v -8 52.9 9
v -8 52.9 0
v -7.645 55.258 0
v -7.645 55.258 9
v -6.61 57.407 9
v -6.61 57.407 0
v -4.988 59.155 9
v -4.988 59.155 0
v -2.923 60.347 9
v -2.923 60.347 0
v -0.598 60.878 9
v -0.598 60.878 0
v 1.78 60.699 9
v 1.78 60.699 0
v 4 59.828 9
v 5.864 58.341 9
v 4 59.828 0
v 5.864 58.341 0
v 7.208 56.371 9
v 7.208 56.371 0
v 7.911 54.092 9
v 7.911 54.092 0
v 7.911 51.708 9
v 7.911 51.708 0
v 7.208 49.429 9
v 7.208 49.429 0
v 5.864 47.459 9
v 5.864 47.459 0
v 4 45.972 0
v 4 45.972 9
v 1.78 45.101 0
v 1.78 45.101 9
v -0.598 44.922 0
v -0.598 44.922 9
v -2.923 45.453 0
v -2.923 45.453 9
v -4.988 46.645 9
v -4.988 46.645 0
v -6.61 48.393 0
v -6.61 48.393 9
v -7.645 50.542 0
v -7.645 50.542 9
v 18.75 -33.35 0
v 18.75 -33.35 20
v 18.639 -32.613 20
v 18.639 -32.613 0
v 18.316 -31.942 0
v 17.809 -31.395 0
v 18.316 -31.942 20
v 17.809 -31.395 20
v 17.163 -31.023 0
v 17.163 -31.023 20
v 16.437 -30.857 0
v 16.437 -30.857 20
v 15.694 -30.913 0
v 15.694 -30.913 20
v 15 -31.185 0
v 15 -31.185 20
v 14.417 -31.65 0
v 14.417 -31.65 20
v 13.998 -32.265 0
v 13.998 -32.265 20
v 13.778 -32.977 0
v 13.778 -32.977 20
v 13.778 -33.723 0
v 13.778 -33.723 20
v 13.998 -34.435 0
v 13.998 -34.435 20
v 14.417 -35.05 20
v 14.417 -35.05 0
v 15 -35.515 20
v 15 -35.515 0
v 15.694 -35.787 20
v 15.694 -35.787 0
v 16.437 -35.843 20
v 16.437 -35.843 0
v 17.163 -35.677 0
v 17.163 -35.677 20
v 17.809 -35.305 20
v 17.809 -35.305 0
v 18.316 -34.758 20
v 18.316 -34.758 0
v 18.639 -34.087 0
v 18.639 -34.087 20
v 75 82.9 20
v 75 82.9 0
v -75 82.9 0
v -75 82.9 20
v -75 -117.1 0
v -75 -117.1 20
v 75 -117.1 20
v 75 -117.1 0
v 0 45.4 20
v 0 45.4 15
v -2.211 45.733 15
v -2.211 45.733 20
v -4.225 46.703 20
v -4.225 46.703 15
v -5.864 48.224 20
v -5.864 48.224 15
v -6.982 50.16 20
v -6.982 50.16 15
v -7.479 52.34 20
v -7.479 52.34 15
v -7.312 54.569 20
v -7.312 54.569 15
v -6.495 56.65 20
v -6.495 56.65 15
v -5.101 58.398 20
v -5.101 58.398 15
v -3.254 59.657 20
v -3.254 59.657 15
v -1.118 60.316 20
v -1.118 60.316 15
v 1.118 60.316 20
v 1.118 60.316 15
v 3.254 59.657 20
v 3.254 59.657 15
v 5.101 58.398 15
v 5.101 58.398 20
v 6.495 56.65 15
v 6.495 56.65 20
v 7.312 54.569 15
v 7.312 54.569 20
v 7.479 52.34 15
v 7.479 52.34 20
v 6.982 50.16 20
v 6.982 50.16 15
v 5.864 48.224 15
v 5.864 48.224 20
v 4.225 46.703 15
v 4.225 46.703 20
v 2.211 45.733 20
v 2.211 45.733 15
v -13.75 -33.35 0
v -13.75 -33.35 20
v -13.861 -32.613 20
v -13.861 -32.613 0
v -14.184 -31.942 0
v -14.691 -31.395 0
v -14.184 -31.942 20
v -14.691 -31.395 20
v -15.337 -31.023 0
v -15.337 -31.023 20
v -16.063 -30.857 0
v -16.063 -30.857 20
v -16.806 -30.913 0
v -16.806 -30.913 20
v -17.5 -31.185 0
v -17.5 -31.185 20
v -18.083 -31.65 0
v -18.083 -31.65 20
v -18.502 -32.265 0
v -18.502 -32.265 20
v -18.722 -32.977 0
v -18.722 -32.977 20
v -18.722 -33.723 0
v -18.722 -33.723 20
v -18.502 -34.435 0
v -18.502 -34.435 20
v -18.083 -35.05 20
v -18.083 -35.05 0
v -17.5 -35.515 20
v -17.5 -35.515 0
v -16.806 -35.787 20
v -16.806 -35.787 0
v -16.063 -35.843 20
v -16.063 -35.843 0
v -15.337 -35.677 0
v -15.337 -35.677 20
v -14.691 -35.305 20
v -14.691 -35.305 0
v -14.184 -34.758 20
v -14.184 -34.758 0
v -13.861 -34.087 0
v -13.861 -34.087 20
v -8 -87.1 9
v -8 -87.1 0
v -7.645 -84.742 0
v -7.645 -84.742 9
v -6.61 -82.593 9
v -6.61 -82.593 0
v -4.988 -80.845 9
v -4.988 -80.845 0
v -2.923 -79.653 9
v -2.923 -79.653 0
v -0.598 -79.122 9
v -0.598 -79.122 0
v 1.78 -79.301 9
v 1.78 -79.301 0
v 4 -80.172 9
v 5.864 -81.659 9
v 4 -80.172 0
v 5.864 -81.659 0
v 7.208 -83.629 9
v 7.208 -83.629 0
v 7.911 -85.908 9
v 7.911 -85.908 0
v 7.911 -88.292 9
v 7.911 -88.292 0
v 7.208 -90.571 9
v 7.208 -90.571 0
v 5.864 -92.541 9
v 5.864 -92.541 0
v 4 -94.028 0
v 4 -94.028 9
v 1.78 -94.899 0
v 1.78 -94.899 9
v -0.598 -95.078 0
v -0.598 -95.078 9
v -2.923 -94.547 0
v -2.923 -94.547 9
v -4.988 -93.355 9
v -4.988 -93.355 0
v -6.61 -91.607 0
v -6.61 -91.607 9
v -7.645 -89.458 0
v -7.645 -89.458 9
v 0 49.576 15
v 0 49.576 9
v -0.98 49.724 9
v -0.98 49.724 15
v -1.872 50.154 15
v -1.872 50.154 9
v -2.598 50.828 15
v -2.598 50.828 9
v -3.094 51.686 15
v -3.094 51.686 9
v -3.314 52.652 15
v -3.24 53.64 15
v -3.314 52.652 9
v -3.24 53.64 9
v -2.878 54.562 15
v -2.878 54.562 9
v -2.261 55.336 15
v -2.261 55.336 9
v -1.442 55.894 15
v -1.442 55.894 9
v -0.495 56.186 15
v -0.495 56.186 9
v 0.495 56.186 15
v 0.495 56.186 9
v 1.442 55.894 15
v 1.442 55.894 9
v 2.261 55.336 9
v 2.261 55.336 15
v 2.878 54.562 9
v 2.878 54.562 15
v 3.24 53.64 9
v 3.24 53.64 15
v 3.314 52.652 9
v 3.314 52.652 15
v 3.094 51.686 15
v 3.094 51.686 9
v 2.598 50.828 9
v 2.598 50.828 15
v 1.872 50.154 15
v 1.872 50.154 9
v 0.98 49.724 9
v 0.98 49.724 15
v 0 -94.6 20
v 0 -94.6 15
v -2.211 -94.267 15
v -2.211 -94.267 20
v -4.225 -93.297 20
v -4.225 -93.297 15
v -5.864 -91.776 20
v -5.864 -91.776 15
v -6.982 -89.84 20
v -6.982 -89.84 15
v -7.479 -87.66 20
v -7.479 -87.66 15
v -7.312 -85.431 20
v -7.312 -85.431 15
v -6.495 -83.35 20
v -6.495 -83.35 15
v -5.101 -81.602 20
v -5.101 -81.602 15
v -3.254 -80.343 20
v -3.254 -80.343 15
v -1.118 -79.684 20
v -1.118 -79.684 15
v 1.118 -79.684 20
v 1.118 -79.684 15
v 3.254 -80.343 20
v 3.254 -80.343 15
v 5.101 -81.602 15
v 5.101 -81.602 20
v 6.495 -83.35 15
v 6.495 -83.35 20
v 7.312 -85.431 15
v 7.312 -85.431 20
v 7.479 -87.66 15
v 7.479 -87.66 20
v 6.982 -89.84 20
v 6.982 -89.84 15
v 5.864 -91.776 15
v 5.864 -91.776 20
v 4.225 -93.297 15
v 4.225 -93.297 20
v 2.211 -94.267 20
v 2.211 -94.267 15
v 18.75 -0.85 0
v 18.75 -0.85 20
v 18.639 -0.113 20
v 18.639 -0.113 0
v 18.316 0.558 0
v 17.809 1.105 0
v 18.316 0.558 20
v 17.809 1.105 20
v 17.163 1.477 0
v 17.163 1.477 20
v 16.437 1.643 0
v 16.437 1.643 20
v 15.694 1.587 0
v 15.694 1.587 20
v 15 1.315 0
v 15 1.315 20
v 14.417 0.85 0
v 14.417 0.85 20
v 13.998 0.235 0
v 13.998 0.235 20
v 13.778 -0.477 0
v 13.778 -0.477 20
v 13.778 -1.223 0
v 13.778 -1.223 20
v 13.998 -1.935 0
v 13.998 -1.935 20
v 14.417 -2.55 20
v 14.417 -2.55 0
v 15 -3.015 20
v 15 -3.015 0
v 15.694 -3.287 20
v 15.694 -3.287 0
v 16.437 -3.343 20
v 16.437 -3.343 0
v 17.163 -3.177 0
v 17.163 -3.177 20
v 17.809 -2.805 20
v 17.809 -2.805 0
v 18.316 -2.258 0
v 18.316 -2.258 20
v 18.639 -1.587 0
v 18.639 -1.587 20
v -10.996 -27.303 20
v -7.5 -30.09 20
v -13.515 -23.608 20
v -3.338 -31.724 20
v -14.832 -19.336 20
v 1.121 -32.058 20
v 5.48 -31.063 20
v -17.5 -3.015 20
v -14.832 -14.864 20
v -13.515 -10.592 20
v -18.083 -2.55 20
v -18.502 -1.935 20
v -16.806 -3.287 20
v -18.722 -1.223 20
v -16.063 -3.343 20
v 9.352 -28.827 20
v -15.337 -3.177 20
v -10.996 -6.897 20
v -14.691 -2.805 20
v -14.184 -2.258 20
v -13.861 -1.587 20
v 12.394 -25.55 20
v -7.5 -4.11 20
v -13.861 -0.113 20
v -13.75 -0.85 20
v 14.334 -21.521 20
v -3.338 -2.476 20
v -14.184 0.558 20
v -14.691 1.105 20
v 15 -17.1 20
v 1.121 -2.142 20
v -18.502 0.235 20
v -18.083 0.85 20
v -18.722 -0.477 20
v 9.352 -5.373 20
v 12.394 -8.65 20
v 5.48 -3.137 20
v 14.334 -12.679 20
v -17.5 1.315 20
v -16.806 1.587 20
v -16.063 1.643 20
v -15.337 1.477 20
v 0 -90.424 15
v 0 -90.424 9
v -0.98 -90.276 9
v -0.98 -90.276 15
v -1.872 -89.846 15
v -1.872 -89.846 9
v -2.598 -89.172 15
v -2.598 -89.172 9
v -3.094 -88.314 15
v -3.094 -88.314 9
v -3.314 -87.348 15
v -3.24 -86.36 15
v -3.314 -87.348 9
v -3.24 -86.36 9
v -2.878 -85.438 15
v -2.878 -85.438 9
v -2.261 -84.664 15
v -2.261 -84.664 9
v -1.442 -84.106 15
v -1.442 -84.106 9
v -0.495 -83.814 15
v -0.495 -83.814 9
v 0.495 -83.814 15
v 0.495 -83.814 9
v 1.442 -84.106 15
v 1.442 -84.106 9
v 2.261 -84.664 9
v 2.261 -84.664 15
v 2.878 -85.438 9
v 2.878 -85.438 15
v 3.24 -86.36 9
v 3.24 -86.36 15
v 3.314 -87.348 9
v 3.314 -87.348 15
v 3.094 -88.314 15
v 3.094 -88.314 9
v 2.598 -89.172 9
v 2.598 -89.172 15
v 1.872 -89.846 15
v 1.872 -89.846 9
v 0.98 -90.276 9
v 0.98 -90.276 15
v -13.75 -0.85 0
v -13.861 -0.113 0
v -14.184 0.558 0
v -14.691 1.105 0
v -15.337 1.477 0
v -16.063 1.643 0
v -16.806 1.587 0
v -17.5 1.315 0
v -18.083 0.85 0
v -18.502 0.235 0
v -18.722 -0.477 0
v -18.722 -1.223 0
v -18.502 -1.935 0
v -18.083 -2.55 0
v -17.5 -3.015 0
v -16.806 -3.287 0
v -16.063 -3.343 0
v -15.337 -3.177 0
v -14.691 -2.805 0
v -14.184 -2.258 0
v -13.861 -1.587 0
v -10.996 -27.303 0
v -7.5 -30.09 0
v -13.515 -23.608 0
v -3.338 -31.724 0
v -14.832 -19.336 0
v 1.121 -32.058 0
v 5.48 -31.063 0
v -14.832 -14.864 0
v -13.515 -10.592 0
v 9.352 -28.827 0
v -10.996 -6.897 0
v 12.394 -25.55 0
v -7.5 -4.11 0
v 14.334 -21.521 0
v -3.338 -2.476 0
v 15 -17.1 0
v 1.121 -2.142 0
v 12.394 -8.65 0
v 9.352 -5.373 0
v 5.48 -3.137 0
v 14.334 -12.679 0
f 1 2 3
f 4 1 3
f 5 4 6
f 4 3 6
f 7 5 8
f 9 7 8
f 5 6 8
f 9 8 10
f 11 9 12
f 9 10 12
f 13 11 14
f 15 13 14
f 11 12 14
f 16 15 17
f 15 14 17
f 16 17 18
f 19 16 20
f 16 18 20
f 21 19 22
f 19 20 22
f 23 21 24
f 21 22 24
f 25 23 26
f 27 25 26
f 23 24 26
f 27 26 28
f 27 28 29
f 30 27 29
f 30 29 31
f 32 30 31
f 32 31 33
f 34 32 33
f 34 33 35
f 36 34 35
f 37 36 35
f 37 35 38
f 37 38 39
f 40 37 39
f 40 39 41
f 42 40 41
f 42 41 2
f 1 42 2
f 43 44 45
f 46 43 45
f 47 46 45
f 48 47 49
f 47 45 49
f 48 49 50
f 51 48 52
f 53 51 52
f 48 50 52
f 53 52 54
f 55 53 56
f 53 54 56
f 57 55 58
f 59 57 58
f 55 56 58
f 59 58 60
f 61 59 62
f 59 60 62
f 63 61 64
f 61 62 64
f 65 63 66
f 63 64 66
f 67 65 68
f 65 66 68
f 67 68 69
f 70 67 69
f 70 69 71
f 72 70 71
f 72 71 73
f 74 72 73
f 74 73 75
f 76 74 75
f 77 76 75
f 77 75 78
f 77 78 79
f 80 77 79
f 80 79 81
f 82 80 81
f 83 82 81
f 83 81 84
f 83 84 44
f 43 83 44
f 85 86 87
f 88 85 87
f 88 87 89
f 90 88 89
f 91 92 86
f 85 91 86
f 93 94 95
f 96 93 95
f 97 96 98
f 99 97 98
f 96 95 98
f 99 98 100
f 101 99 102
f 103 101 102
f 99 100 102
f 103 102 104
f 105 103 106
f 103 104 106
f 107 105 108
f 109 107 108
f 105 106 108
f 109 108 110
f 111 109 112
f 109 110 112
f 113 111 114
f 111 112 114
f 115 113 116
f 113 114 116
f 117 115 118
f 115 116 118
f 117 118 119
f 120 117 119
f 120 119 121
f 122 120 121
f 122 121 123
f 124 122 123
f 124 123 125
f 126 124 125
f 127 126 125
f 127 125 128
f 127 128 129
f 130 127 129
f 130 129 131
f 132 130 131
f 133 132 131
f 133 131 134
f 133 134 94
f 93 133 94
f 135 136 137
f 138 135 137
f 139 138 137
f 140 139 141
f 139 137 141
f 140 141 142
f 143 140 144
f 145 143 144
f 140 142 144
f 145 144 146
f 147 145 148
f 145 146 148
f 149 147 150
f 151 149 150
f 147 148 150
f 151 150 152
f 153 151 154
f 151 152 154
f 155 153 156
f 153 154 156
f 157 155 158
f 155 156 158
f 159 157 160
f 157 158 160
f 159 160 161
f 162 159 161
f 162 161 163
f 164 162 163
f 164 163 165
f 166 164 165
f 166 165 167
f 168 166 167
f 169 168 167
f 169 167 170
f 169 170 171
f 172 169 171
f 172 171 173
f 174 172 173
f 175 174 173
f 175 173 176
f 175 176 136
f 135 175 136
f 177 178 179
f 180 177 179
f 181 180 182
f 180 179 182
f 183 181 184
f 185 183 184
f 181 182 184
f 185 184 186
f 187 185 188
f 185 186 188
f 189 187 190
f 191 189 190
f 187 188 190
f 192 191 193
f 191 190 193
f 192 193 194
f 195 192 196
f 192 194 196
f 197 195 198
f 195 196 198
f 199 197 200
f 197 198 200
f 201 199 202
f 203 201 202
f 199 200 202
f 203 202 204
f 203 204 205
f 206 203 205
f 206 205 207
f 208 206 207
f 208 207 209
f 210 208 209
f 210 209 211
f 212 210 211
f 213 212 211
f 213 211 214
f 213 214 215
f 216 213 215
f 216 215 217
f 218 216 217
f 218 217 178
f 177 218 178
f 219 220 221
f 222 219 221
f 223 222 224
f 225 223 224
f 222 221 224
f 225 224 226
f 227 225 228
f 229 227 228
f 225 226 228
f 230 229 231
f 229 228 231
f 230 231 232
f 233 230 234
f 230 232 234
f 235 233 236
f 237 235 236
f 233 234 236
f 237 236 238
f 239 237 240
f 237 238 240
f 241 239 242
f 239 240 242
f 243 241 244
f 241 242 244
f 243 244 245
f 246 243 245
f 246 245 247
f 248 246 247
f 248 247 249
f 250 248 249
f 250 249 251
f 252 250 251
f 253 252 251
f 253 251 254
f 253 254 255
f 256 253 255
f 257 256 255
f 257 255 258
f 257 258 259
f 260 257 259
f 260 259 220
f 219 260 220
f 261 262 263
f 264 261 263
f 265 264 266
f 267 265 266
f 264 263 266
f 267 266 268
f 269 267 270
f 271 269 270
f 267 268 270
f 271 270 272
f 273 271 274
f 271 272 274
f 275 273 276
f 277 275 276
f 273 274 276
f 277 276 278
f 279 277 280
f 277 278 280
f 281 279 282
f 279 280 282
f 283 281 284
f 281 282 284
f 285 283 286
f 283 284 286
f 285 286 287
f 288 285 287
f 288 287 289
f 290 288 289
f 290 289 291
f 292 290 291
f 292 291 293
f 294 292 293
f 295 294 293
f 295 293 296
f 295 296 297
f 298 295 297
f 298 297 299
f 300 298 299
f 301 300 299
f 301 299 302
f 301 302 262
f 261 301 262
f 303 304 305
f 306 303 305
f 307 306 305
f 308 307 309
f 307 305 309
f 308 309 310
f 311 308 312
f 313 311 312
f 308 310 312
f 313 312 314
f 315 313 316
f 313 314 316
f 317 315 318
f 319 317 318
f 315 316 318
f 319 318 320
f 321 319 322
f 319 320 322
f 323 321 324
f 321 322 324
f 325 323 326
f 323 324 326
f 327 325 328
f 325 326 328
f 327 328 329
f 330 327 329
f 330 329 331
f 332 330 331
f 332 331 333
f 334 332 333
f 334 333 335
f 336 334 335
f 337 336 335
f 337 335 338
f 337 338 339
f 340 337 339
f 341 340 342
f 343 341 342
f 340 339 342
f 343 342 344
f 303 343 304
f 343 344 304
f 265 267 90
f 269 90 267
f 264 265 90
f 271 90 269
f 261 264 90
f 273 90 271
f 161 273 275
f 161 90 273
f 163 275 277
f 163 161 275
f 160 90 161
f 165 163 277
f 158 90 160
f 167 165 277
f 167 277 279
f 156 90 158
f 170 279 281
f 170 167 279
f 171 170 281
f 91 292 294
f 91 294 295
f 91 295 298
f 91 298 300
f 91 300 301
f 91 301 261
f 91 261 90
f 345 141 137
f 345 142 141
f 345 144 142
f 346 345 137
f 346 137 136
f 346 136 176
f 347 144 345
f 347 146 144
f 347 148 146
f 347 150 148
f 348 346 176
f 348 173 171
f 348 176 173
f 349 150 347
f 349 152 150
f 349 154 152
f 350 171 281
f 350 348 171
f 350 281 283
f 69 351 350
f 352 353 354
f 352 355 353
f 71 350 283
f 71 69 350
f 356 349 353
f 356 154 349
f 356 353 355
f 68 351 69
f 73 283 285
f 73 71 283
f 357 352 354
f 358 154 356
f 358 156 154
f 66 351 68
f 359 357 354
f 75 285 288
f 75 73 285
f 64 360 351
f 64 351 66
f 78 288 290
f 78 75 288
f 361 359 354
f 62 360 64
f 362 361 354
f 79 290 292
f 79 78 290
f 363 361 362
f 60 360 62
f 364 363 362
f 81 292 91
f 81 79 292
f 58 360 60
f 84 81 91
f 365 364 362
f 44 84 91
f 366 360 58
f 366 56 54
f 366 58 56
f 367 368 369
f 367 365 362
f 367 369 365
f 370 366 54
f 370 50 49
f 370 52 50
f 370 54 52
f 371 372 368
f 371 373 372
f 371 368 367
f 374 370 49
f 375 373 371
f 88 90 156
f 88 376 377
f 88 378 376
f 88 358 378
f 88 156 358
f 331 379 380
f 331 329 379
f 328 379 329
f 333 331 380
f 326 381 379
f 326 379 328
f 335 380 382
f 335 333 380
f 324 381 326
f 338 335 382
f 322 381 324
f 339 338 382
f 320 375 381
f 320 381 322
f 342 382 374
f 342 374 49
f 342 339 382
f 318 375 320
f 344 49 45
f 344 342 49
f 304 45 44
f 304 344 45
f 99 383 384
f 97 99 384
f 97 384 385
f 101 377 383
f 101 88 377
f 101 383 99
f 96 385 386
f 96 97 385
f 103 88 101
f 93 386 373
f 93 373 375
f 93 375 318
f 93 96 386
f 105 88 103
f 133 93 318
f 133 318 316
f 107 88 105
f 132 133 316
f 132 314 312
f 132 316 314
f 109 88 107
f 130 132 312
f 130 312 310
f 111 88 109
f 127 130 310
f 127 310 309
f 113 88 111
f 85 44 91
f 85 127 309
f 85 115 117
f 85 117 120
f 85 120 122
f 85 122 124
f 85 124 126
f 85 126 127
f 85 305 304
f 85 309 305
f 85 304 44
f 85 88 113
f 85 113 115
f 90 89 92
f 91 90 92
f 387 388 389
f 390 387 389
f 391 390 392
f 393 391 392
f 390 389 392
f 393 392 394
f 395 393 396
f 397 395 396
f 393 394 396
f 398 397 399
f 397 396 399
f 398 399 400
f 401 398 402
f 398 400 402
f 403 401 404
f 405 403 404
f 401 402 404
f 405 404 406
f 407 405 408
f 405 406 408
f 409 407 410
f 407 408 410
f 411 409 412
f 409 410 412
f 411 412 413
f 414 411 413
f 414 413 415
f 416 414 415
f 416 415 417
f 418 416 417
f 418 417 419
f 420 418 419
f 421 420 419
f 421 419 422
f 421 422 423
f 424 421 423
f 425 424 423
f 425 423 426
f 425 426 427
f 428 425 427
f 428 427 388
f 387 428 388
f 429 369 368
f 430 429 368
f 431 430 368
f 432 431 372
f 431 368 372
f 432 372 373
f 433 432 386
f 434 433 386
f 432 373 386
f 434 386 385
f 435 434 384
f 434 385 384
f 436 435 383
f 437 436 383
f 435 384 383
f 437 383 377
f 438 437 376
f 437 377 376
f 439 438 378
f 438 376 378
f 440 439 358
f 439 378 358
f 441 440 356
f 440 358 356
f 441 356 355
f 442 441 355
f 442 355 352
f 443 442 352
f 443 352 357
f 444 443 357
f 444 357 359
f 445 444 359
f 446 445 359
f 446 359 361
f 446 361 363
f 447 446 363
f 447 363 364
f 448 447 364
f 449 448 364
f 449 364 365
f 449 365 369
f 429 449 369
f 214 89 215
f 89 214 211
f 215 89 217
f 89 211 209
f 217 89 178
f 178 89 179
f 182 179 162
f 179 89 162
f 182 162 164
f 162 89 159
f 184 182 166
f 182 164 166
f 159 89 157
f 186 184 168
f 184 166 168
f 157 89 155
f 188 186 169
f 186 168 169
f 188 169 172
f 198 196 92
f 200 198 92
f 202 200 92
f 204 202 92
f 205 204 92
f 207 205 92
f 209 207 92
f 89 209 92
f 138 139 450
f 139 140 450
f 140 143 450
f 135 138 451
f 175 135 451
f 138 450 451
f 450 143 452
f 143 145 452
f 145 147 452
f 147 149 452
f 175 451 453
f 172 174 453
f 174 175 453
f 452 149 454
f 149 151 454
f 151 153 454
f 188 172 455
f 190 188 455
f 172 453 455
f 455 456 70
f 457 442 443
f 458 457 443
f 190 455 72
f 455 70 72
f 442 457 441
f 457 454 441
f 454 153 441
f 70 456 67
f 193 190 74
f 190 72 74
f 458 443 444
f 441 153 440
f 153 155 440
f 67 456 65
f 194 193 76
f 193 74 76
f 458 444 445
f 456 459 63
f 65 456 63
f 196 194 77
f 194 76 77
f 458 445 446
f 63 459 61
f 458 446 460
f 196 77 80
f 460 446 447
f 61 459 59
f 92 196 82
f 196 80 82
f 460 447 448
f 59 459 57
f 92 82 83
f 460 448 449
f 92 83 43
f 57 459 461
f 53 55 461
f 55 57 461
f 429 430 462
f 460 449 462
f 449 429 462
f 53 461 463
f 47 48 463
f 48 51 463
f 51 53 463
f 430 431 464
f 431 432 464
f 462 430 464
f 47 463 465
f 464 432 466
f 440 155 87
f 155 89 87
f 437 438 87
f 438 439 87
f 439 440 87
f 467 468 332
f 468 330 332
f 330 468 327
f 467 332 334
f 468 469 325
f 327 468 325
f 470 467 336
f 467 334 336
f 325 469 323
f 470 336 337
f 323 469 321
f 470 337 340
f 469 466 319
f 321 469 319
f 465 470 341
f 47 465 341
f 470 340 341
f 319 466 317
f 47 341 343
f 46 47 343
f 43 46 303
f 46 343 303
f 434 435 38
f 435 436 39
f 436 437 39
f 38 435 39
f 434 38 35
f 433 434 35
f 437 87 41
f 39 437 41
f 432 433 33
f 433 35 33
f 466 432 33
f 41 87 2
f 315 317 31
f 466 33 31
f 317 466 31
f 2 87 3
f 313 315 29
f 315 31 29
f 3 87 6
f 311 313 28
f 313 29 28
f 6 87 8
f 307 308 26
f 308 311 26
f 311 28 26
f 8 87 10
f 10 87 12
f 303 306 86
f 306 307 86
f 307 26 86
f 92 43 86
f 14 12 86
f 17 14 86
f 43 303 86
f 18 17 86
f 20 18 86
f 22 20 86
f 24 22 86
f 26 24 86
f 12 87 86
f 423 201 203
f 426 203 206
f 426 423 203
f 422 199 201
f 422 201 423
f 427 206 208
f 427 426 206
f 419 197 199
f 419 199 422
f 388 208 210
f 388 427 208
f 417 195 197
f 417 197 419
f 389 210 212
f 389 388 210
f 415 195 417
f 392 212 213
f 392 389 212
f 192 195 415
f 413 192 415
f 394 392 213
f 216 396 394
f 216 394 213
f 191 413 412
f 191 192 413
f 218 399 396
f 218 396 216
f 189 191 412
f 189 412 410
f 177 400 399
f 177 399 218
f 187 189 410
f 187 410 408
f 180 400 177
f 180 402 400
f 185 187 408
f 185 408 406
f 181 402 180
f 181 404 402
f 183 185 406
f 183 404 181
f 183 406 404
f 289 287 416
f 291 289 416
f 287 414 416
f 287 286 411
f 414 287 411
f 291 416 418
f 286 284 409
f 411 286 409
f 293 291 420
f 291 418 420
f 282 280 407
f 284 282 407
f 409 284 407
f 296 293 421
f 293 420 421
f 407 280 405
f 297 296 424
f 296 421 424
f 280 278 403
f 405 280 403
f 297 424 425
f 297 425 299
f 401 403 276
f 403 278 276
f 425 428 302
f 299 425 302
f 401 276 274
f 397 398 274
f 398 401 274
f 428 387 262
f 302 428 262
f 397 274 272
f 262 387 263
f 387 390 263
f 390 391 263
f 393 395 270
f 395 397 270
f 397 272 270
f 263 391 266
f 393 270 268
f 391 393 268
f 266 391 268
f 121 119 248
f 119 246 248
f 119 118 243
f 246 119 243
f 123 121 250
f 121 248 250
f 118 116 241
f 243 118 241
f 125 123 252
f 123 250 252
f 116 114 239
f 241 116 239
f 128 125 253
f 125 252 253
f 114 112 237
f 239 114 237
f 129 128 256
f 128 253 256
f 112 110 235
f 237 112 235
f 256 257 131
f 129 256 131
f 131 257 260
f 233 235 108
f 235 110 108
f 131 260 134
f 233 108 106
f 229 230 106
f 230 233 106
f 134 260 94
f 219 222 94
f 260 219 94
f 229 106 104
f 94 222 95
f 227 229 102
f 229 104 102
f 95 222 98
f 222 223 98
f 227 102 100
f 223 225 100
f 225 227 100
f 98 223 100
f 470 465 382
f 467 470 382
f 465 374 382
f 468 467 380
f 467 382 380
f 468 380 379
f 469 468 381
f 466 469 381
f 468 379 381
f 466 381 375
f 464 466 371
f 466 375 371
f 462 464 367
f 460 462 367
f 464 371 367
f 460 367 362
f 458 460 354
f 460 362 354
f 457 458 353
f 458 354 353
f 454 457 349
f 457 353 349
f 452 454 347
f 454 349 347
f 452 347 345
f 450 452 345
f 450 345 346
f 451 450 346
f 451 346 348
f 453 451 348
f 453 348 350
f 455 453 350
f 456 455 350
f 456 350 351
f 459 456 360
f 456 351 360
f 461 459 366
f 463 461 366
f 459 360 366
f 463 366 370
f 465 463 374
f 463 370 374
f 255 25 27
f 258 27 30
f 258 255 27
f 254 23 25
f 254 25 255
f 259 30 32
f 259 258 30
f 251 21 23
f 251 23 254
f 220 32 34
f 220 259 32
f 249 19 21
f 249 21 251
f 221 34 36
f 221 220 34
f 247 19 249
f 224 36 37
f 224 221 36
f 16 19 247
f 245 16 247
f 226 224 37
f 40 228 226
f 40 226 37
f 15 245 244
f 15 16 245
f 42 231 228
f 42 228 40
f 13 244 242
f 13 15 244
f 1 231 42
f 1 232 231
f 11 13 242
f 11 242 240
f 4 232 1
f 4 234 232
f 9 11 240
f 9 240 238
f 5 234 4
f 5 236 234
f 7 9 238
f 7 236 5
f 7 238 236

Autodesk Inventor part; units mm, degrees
ref_plane "YZ Plane" through (0, 0, 0) normal (1, 0, 0) x (0, 1, 0)
ref_plane "XZ Plane" through (0, 0, 0) normal (0, 1, 0) x (-1, 0, 0)
ref_plane "Work Plane1" through (0, 0, 0) normal (0, 0, 1) x (1, 0, 0)
sketch "Sketch1" plane through (0, 0, 0) normal (0, 0, 1) x (1, 0, 0)
  line L0 (-75, -117.1) -> (75, -117.1) projected
  line L1 (75, -117.1) -> (75, 82.9) projected
  line L2 (75, 82.9) -> (-75, 82.9) projected
  line L3 (-75, 82.9) -> (-75, -117.1) projected
  point P0 (0, -17.1)
  dimension "d11" = 100
extrude "Extrusion1" add sketch "Sketch1" along normal blind 20
sketch "Sketch2" plane through (0, 0, 20) normal (0, 0, 1) x (1, 0, 0)
  circle A0 centre (0, -17.1) radius 15
  line L0 (75, 82.9) -> (-75, 82.9) projected
  line L1 (-75, 82.9) -> (-75, -117.1) projected
  circle A1 centre (-16.25, -0.85) radius 2.5
  circle A2 centre (16.25, -0.85) radius 2.5
  circle A3 centre (-16.25, -33.35) radius 2.5
  circle A4 centre (16.25, -33.35) radius 2.5
  point P0 (0, 0)
  dimension "d6" = 30
  dimension "d7" = 100
  dimension "d8" = 75
  dimension "d15" = 5
  dimension "d16" = 16.25
  dimension "d17" = 16.25
  dimension "d18" = 16.25
  dimension "d19" = 16.25
  dimension "d20" = 16.25
  dimension "d21" = 16.25
  dimension "d22" = 16.25
  dimension "d23" = 16.25
extrude "Extrusion2" cut sketch "Sketch2" against normal through all
sketch "Sketch4" plane through (0, 0, 0) normal (0, 0, -1) x (-1, 0, 0)
  circle A0 centre (0, -17.1) radius 15 projected
  circle A1 centre (0, 52.9) radius 8
  circle A2 centre (0, -87.1) radius 8
  point P0 (0, 0)
  dimension "d33" = 70
  dimension "d34" = 70
  dimension "d35" = 16
extrude "Extrusion3" cut sketch "Sketch4" against normal blind 9 contours A1 | A2
sketch "Sketch5" plane through (0, 0, 20) normal (0, 0, 1) x (1, 0, 0)
  circle A0 centre (0, -17.1) radius 15 projected
  point P0 (0, 0)
  point P1 (0, -87.1)
  point P2 (0, 52.9)
  dimension "d38" = 70
  dimension "d39" = 70
hole "Hole2" at (0, -87.1, 20) at (0, 52.9, 20) direction (0, 0, -1) diameter 6.647 end through all counterbore diameter 15 counterbore depth 5 thread size "M8x1.25" class "6H" standard "ISO Metric profile"
equation "\"d17\" = d16"
equation "\"d18\" = d16"
equation "\"d19\" = d16"
equation "\"d20\" = d16"
equation "\"d21\" = d16"
equation "\"d22\" = d16"
equation "\"d23\" = d16"
properties part number "Soporte Pistón"
